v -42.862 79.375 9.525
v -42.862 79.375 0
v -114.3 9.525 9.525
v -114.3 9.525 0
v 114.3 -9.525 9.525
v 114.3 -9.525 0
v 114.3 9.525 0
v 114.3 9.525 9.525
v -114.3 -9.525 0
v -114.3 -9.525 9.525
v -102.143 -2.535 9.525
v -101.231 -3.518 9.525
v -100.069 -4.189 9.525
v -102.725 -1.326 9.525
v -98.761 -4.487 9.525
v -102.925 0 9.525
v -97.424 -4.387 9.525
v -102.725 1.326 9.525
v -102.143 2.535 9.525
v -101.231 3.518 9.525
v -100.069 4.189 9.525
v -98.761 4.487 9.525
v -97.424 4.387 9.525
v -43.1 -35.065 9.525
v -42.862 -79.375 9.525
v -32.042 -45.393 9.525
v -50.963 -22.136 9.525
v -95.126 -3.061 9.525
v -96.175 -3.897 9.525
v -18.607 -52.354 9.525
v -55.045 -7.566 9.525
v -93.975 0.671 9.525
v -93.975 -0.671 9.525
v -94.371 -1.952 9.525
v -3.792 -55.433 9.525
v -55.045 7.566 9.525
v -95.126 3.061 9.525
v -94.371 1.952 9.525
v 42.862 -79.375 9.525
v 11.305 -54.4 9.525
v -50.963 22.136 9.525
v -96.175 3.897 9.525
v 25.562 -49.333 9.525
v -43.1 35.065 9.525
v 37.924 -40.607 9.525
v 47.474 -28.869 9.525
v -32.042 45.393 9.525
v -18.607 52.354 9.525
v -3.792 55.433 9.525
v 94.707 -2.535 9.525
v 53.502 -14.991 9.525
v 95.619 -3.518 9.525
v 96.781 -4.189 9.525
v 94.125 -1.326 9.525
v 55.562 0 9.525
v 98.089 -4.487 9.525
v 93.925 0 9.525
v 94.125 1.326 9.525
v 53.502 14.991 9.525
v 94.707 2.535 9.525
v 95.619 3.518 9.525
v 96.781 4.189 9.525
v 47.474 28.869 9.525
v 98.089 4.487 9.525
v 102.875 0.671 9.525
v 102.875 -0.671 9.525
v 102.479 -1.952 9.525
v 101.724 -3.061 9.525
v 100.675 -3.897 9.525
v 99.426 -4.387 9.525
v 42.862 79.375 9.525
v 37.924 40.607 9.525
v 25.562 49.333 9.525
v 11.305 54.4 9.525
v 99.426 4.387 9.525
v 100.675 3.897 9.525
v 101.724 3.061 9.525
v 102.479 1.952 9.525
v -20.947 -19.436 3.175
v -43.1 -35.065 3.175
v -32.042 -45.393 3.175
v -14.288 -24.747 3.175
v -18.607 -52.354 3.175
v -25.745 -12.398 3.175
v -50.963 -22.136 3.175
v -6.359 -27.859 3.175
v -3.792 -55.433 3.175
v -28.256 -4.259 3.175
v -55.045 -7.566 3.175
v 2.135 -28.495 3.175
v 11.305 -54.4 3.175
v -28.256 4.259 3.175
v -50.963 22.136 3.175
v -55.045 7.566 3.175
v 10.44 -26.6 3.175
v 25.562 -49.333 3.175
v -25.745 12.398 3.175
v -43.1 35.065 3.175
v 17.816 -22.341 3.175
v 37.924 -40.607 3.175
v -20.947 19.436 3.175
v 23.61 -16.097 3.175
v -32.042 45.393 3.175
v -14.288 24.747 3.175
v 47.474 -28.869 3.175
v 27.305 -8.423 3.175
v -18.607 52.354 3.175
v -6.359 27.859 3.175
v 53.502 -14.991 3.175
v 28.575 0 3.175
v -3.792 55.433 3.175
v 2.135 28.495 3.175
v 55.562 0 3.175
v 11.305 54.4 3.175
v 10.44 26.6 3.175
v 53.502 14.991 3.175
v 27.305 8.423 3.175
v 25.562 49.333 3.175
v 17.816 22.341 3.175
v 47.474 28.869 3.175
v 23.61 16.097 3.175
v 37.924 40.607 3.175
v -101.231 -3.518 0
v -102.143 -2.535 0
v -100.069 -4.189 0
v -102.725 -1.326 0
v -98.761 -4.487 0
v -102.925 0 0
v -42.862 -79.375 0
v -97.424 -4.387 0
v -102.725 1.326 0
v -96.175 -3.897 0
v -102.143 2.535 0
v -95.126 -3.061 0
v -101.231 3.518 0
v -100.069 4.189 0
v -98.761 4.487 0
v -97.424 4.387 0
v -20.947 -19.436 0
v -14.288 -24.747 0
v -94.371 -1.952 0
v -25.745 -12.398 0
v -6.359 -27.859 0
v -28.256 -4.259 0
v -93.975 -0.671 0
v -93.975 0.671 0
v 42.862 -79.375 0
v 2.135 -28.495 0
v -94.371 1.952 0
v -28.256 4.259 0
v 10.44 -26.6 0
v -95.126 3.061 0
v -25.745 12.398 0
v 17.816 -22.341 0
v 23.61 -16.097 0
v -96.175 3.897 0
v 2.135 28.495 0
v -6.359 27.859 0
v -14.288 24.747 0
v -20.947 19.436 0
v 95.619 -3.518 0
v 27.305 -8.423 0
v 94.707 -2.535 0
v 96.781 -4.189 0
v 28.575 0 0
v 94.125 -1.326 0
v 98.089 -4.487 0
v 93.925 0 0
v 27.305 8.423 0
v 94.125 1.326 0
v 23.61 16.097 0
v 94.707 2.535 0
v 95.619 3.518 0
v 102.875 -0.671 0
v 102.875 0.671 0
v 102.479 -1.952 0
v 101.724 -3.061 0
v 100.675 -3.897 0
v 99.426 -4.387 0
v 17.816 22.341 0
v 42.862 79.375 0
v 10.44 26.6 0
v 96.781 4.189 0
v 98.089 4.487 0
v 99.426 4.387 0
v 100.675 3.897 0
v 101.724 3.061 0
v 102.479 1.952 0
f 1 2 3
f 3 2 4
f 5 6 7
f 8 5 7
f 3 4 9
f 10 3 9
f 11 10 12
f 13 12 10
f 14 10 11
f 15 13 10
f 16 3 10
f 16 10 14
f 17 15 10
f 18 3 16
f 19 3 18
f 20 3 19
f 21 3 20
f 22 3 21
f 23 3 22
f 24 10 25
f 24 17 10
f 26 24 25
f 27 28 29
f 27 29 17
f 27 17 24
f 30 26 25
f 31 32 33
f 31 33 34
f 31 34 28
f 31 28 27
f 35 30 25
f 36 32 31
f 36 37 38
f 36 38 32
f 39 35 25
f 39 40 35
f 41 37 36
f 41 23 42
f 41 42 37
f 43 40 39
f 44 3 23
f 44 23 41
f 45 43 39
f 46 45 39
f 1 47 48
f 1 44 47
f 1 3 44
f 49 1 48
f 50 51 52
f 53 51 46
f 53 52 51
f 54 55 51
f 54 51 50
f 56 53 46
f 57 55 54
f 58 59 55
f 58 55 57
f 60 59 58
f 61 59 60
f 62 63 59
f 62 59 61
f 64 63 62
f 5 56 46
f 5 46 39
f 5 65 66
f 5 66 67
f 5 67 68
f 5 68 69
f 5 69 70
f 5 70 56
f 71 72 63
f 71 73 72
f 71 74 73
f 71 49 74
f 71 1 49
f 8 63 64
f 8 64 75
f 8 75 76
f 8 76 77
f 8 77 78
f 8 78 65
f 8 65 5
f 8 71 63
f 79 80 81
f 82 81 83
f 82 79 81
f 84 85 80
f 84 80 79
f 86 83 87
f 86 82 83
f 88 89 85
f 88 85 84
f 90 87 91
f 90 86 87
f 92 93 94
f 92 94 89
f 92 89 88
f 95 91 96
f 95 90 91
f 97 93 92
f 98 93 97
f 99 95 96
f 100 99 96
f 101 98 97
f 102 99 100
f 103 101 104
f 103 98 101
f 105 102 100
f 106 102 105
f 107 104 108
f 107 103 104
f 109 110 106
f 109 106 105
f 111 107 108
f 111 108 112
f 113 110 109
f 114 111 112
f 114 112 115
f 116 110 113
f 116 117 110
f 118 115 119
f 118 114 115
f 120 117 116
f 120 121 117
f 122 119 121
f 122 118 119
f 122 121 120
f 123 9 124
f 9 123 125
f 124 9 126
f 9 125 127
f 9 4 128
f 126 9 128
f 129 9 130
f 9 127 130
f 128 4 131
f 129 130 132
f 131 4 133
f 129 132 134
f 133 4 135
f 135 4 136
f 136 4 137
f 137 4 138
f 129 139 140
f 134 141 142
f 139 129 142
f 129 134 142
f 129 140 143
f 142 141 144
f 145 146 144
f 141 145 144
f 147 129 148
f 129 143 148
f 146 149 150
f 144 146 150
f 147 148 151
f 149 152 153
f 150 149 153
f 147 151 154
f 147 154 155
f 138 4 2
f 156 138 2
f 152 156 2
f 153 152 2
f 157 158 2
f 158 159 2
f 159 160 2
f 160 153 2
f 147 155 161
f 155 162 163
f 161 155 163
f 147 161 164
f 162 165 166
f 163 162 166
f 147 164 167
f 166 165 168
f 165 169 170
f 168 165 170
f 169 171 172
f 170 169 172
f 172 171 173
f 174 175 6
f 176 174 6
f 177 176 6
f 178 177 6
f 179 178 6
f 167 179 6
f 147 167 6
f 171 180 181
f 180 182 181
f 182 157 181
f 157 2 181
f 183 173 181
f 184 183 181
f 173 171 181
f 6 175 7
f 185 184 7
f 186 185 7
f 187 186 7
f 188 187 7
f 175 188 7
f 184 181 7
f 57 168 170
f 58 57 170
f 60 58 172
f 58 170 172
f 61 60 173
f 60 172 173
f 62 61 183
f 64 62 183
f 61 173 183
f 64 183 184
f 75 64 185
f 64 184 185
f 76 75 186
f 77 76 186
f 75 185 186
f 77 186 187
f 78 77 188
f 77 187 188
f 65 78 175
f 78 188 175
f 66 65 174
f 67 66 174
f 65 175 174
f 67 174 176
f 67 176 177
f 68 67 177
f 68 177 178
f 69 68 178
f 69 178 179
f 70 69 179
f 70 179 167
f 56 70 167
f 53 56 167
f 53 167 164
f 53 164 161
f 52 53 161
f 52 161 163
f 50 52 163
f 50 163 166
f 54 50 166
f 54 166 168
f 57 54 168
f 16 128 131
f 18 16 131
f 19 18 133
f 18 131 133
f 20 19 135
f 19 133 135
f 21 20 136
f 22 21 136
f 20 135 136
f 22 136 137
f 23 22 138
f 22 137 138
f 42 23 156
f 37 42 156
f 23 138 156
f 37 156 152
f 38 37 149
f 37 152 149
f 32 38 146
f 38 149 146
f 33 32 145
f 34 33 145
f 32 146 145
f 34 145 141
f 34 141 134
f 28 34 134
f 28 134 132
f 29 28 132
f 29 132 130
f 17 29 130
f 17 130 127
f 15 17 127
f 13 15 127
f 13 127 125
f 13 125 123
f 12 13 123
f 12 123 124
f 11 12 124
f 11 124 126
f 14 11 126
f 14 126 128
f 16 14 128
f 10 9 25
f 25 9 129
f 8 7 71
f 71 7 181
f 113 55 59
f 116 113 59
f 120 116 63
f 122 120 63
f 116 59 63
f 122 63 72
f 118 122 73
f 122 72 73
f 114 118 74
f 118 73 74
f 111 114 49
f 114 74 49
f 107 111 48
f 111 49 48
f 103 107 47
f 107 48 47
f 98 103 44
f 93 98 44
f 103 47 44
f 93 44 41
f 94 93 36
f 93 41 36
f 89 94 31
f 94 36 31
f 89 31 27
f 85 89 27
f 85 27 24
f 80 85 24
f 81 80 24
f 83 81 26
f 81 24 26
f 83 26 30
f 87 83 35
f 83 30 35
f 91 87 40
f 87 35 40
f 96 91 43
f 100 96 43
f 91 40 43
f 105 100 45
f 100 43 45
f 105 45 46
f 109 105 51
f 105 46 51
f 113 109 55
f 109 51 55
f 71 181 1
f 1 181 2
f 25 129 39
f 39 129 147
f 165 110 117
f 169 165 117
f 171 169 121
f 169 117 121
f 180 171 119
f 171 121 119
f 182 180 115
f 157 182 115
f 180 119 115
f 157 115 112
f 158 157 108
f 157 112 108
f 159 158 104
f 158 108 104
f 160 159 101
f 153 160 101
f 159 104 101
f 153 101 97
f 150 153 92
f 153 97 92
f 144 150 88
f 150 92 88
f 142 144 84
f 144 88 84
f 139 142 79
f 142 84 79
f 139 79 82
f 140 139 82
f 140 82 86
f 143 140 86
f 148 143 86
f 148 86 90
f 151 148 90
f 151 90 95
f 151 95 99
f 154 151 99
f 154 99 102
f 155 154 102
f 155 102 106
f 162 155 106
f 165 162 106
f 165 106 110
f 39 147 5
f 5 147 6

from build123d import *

# Parameters (mm, degrees)
F1_DEPTH = 9.525
F2_R     = 55.5625
F3_DEPTH = 6.35
F5_D     = 9
F6_R     = 28.575
F7_DEPTH = 3.176


with BuildPart() as f1:
    # F0 (on Top) → F1 (new body)
    with BuildSketch(Plane.XY):
        Polygon((-42.8625, 79.375), (-114.3, 9.525), (-114.3, -9.525), (-42.8625, -79.375), (42.8625, -79.375), (114.3, -9.525), (114.3, 9.525), (42.8625, 79.375), align=None)
    extrude(amount=F1_DEPTH)

    # F2 (on face) → F3 (cut)
    with BuildSketch(Plane.XY.offset(9.525)):
        Circle(F2_R)
    extrude(amount=-F3_DEPTH, mode=Mode.SUBTRACT)

    # F5 (through all)
    with Locations(Plane.XY.offset(9.525)):
        with Locations((-98.425, 0), (98.425, 0)):
            Hole(F5_D / 2)

    # F6 (on face) → F7 (cut, through all)
    with BuildSketch(Plane.XY.offset(3.175)):
        Circle(F6_R)
    extrude(amount=-F7_DEPTH, mode=Mode.SUBTRACT)


solid = f1.part
